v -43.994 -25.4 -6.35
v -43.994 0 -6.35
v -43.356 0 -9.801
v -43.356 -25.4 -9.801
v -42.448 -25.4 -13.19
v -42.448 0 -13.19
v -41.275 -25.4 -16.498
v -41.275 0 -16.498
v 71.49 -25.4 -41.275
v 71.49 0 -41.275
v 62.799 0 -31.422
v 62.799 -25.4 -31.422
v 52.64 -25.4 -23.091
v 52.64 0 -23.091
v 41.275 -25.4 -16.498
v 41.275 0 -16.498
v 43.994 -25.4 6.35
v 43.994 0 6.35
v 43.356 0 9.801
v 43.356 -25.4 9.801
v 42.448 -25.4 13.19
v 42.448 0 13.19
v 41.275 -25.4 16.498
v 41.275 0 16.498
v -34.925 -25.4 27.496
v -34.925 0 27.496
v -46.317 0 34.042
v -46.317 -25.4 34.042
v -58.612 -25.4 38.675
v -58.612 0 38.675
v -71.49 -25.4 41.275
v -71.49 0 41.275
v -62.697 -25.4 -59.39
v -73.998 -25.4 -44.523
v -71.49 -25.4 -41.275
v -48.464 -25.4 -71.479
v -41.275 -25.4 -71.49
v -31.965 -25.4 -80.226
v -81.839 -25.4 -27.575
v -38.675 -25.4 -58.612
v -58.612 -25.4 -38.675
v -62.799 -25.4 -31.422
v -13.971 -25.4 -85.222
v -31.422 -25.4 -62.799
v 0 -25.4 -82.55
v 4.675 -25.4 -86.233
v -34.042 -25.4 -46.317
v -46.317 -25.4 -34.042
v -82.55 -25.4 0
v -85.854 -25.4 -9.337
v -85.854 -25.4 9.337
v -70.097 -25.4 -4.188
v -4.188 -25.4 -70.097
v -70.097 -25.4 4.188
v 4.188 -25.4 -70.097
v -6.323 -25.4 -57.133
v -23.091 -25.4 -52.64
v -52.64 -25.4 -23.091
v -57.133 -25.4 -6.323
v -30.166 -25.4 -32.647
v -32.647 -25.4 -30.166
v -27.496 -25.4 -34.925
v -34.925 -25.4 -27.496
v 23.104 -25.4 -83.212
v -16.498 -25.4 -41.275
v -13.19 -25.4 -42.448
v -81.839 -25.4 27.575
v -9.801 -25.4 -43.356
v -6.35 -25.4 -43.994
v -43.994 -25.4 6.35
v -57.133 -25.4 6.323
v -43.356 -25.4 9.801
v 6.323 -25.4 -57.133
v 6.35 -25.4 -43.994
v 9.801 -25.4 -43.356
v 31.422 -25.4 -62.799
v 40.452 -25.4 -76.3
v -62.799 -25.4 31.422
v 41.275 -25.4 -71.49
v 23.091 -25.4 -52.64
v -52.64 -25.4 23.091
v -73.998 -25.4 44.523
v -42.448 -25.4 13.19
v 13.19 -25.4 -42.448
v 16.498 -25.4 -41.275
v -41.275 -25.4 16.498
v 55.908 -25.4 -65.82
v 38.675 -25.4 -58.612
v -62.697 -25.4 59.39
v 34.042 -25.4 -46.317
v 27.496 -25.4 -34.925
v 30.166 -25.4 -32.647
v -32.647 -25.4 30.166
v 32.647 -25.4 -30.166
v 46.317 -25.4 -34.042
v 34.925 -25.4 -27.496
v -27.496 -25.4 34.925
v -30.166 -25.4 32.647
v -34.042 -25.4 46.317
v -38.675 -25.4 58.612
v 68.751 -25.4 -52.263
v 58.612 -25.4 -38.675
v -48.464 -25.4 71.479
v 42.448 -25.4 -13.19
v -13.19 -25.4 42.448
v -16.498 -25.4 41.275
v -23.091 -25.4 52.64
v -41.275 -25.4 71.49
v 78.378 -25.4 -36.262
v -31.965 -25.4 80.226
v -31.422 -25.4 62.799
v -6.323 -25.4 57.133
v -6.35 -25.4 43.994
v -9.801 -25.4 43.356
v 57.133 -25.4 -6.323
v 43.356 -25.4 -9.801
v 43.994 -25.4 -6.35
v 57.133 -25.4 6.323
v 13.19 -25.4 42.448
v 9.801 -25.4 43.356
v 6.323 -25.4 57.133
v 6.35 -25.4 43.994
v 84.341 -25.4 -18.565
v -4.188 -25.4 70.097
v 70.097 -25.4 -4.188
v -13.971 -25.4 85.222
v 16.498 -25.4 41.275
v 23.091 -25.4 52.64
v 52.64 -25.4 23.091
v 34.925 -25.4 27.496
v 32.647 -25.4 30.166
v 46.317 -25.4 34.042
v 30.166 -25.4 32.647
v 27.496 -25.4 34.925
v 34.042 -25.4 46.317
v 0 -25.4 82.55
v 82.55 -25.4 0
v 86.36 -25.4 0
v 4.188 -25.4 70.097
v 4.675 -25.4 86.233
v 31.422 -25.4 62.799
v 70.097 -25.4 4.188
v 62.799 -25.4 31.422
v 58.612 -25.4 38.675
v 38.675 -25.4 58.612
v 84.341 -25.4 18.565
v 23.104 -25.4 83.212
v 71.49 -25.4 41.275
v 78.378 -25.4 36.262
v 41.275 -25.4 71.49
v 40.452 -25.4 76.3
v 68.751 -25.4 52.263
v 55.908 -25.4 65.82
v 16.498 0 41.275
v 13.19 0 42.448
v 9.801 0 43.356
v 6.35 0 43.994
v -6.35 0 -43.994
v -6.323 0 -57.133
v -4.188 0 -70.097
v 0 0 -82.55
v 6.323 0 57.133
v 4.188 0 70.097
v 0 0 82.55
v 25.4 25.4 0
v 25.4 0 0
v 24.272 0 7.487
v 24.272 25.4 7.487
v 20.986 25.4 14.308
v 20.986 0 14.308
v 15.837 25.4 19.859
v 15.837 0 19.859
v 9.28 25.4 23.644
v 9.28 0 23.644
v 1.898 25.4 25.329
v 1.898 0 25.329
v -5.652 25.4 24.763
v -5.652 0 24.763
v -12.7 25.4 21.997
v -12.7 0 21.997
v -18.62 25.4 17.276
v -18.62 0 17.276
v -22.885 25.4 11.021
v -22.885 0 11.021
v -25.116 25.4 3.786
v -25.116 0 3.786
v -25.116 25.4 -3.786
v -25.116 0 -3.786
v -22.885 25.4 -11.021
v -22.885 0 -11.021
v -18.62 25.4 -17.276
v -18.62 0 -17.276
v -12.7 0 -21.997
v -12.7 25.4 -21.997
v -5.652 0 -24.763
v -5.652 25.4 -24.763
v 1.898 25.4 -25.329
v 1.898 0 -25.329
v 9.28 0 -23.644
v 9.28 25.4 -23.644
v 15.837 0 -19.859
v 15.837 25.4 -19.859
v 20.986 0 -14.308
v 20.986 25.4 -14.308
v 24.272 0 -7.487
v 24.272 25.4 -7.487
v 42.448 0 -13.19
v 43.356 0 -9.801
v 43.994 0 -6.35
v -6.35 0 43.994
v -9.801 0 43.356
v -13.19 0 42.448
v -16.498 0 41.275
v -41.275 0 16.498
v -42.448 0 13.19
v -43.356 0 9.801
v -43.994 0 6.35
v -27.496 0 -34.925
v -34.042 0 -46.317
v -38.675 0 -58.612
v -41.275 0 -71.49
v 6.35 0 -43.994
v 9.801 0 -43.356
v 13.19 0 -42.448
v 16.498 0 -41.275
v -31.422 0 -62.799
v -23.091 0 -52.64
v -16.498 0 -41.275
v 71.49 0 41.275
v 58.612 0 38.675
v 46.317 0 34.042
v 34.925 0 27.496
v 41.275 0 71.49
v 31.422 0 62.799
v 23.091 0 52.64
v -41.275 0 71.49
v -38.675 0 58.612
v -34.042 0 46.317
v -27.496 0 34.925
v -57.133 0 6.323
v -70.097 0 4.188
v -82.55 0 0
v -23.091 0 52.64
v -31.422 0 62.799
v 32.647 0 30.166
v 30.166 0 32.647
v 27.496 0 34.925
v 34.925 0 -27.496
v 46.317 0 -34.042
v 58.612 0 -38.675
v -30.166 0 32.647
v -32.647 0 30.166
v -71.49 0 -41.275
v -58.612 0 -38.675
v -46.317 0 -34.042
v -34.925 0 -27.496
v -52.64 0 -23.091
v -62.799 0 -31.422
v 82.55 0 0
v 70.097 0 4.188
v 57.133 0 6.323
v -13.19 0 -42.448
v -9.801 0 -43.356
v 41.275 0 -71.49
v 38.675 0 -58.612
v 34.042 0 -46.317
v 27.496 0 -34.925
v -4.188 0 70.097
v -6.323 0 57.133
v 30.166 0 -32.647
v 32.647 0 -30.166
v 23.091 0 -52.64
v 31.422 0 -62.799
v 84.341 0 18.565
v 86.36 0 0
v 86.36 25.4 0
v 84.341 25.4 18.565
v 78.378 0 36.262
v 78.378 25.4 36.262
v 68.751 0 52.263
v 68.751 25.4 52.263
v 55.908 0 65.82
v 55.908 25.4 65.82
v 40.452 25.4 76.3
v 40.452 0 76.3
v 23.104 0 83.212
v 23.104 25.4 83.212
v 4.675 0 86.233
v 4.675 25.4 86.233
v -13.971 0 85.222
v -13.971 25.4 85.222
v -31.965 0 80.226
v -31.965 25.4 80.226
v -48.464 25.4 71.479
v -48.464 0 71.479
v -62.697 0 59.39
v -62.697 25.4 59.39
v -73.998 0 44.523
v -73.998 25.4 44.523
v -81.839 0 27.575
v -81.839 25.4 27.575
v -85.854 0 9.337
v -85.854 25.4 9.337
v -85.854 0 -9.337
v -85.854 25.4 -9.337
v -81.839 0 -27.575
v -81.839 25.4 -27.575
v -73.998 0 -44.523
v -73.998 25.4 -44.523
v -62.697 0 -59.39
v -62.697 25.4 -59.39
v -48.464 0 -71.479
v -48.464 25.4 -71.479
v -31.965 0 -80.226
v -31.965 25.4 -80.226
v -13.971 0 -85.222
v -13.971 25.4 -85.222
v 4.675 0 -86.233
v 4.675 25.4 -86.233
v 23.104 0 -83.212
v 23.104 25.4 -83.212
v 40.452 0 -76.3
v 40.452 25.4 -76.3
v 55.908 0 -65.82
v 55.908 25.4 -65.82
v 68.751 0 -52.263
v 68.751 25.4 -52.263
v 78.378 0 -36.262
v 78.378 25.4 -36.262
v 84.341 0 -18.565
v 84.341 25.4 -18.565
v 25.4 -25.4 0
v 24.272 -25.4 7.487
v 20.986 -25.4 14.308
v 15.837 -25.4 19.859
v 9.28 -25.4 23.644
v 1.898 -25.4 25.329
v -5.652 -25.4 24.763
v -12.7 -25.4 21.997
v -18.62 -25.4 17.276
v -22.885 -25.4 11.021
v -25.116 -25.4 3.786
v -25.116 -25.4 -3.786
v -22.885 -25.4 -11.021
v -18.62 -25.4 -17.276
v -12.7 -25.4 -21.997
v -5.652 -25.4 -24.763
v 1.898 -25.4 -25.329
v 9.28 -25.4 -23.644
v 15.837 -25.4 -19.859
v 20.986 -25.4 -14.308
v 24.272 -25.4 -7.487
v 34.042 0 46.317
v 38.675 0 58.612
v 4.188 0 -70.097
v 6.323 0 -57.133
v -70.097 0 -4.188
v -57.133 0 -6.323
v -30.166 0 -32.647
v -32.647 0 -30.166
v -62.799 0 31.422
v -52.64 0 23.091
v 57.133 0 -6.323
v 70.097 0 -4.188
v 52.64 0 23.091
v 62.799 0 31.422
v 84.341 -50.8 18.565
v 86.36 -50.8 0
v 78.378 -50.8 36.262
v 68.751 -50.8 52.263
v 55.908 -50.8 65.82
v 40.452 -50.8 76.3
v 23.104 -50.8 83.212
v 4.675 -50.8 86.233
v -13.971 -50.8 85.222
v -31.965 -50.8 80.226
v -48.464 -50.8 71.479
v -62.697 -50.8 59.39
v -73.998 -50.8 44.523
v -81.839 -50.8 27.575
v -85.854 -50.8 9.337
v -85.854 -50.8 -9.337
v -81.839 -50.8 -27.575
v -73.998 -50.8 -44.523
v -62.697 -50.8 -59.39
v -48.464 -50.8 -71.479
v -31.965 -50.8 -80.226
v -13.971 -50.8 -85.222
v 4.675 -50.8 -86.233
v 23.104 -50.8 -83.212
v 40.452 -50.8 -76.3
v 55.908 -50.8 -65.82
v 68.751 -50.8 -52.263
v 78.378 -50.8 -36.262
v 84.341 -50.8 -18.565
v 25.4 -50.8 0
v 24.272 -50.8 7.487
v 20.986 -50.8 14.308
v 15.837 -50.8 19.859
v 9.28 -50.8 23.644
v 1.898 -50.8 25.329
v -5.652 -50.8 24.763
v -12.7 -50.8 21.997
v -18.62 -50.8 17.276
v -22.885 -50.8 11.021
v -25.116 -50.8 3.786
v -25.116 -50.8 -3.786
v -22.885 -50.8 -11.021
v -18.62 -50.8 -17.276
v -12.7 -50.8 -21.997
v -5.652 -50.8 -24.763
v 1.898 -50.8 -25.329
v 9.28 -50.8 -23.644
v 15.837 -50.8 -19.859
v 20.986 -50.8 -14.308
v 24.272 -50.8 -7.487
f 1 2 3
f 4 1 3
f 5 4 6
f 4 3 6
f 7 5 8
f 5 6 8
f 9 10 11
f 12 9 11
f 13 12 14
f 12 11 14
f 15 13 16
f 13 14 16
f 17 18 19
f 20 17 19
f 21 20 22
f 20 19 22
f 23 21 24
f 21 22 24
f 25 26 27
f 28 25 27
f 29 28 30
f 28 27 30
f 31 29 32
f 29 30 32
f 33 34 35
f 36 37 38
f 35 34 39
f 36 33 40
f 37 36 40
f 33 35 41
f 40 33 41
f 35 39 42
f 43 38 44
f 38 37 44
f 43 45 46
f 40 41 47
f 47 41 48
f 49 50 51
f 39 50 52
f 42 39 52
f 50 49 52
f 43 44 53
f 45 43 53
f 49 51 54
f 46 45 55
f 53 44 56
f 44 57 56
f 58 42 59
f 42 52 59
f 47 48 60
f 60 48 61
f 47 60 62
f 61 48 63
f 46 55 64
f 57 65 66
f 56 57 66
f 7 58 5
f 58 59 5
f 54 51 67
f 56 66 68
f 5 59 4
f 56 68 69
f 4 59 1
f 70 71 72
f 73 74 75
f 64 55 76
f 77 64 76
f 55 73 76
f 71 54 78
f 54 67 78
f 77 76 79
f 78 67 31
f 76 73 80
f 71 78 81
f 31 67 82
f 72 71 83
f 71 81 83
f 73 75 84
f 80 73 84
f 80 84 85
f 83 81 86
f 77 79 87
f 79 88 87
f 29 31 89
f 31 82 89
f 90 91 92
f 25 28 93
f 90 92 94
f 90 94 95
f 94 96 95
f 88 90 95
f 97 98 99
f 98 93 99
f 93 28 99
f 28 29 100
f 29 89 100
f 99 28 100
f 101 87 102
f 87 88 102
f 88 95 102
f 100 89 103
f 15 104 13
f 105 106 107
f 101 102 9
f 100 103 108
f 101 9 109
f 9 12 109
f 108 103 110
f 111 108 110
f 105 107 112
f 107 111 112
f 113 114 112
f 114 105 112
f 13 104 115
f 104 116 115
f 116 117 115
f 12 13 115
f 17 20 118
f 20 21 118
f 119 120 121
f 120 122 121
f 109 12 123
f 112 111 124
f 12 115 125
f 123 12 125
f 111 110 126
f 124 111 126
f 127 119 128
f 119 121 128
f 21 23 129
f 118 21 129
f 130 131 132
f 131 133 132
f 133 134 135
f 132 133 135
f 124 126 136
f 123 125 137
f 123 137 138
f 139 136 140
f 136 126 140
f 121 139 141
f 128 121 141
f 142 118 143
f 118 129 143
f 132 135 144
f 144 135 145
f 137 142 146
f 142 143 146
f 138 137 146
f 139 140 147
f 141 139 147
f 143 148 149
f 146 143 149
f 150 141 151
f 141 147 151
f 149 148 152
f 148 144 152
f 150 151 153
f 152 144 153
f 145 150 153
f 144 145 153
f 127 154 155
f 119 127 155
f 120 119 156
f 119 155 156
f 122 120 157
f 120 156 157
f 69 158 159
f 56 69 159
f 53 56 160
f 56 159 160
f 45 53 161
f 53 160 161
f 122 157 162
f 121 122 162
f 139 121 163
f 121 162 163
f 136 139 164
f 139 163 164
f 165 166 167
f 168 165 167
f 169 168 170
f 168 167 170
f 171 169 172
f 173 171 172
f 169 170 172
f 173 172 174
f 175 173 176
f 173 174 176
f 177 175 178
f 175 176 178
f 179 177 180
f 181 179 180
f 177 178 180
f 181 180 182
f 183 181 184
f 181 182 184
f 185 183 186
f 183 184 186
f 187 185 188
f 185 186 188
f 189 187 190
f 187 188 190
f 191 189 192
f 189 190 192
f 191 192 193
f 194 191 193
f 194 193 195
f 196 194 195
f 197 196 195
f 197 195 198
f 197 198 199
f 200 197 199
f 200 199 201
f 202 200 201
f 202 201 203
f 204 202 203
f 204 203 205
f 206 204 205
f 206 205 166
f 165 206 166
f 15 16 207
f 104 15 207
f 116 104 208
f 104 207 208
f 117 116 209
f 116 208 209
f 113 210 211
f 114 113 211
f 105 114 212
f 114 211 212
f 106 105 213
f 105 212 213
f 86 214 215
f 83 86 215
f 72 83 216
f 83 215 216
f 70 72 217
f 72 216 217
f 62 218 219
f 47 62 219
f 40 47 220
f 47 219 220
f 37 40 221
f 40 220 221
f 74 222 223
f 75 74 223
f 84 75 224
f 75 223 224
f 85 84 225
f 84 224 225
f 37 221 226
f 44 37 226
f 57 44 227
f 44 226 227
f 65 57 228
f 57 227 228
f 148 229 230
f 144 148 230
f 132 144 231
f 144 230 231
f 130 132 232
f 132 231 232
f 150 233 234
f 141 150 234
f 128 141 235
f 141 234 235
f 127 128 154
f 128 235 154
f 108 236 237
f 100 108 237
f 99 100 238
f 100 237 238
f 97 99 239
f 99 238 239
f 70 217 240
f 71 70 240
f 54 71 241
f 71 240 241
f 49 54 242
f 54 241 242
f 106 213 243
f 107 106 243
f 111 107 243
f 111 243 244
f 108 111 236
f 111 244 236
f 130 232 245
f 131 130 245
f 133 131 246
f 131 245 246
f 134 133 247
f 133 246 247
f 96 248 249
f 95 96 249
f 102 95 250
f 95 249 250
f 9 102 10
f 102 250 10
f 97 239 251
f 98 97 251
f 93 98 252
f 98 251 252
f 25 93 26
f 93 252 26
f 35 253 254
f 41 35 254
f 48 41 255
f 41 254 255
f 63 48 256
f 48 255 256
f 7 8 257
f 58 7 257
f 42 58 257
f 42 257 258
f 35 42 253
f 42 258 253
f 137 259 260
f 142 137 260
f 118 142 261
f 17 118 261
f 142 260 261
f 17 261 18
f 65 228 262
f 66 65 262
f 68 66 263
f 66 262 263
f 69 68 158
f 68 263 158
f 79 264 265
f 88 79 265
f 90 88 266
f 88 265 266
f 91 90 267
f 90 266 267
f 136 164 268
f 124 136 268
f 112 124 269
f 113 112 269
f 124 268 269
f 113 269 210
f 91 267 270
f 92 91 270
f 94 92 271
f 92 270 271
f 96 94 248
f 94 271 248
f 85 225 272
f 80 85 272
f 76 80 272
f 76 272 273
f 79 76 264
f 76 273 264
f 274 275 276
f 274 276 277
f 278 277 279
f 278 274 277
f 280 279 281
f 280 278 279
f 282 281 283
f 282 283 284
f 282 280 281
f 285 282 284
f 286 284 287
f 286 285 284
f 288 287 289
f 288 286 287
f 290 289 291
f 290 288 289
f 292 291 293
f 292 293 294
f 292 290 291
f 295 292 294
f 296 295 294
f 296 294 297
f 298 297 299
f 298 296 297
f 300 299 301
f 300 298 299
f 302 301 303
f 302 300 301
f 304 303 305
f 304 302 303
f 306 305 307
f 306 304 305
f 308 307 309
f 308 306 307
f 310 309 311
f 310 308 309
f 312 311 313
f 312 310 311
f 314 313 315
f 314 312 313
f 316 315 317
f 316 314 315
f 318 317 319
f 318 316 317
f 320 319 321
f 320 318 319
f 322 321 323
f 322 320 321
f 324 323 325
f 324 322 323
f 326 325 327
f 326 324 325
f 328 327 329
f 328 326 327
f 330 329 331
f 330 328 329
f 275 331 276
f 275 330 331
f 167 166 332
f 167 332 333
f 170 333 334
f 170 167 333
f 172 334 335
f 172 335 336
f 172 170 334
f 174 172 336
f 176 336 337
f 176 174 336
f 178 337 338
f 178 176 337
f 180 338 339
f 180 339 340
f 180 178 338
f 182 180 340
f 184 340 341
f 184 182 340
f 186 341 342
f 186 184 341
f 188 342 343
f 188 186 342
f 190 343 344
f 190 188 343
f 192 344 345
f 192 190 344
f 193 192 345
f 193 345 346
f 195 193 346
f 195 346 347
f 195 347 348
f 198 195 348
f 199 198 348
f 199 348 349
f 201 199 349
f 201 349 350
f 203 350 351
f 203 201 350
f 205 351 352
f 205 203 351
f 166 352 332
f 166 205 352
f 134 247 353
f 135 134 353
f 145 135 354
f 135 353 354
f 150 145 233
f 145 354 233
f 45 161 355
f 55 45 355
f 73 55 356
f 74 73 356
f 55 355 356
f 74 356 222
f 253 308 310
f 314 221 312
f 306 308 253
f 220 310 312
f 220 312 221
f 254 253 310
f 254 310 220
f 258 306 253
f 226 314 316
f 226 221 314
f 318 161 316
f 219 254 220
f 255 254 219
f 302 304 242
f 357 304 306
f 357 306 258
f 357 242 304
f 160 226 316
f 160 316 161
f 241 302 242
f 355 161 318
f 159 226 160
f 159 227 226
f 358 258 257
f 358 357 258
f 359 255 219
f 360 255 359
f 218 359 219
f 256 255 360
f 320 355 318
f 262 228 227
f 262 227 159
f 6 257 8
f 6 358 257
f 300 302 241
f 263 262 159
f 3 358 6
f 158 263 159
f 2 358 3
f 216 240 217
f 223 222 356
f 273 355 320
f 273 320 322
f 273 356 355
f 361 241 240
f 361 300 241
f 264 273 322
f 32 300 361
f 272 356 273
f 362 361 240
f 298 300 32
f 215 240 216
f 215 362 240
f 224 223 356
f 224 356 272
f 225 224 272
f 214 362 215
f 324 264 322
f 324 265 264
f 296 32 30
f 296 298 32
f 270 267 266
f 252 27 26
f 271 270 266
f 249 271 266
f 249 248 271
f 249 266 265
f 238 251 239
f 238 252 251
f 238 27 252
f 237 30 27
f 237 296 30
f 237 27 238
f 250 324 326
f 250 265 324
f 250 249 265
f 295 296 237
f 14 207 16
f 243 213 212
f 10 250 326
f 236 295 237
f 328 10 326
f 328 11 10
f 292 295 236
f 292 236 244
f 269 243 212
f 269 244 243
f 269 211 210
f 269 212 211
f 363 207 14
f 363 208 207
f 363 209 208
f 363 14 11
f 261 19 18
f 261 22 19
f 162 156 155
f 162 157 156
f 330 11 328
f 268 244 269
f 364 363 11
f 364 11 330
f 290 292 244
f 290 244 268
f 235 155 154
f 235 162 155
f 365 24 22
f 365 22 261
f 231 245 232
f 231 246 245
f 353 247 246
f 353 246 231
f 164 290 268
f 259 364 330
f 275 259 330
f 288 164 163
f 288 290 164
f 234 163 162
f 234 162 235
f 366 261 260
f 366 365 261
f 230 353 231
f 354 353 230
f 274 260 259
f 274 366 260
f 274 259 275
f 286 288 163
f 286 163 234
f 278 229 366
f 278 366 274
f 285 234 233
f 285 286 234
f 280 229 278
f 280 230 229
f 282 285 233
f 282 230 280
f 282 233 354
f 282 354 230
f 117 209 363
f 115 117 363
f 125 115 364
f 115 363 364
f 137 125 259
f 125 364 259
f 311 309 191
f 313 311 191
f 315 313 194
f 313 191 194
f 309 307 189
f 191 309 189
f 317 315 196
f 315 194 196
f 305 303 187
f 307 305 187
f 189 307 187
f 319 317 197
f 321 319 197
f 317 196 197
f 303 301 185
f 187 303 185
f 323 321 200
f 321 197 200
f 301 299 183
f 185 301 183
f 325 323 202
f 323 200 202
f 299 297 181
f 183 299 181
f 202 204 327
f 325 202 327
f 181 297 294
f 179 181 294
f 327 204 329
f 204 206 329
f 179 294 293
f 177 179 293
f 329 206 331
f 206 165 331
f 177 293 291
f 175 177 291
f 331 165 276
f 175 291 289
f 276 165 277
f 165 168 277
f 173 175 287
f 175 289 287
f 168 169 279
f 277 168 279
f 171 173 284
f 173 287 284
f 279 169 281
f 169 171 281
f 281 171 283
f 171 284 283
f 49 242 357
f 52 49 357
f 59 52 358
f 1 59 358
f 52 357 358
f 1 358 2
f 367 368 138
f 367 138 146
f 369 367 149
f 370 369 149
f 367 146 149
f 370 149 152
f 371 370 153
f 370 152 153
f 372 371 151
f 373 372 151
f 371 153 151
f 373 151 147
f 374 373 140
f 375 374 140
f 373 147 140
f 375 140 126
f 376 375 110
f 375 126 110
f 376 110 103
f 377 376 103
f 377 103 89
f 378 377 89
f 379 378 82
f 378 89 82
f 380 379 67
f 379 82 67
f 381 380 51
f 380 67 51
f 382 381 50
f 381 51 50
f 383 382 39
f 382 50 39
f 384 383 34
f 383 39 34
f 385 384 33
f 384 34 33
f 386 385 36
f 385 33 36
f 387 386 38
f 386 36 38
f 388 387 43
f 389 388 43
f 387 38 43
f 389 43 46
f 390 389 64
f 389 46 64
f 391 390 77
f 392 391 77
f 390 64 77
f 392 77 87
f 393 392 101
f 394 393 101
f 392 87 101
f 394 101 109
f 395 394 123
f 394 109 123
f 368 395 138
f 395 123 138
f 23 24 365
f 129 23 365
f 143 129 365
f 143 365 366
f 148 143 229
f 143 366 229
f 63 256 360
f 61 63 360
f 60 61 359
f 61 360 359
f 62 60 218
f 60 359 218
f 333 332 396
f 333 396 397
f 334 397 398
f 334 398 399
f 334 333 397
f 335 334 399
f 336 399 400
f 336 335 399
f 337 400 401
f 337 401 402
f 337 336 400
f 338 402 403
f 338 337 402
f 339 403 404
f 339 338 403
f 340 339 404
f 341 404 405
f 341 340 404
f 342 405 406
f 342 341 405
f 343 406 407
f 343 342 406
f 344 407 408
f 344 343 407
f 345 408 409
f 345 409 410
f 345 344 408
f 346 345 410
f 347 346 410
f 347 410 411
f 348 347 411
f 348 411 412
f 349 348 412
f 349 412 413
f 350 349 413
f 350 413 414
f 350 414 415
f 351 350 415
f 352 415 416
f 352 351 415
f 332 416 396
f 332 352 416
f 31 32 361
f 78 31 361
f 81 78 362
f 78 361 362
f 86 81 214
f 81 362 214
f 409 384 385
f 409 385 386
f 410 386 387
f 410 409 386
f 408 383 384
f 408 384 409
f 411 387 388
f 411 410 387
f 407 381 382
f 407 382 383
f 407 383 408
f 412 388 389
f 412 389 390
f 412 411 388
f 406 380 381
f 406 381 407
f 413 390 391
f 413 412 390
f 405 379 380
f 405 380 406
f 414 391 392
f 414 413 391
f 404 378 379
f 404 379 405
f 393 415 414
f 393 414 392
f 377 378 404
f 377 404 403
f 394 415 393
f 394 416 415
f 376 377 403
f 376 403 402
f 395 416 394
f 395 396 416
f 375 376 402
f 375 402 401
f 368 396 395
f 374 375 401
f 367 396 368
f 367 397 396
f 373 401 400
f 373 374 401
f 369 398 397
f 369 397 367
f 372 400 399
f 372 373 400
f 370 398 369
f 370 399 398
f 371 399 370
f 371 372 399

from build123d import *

# Parameters (mm, degrees)
F0_R      = 31.75
F0_R_2    = 25.4
F1_DEPTH  = 25.4
F2_R      = 86.36
F3_DEPTH  = 25.4
F3_FACE_R = 25.4
F4_DEPTH  = 50.8
F5_R      = 86.36
F5_R_2    = 25.4
F6_DEPTH  = 25.4


with BuildPart() as f1:
    # F0 (on Front) → F1 (new body)
    with BuildSketch(Plane.XZ):
        with BuildLine():
            ThreePointArc((-6.35, 43.99409), (0, 44.45), (6.35, 43.99409))
            ThreePointArc((6.35, 43.99409), (5.51657, 63.657692), (0, 82.55))
            ThreePointArc((0, 82.55), (-5.51657, 63.657692), (-6.35, 43.99409))
        make_face()
        with BuildLine():
            ThreePointArc((-27.496306, 34.925), (-22.225, 38.494829), (-16.497784, 41.275))
            ThreePointArc((-16.497784, 41.275), (-27.051357, 57.887463), (-41.275, 71.490397))
            ThreePointArc((-41.275, 71.490397), (-36.606335, 52.370894), (-27.496306, 34.925))
        make_face()
        with BuildLine():
            ThreePointArc((-41.275, 16.497784), (-38.494829, 22.225), (-34.925, 27.496307))
            ThreePointArc((-34.925, 27.496307), (-52.370894, 36.606335), (-71.490397, 41.275))
            ThreePointArc((-71.490397, 41.275), (-57.887463, 27.051357), (-41.275, 16.497784))
        make_face()
        with BuildLine():
            ThreePointArc((-43.99409, -6.35), (-44.45, 0), (-43.99409, 6.35))
            ThreePointArc((-43.99409, 6.35), (-63.657692, 5.51657), (-82.55, 0))
            ThreePointArc((-82.55, 0), (-63.657692, -5.51657), (-43.99409, -6.35))
        make_face()
        with BuildLine():
            ThreePointArc((-71.490397, -41.275), (-52.370894, -36.606335), (-34.925, -27.496306))
            ThreePointArc((-34.925, -27.496306), (-38.494829, -22.225), (-41.275, -16.497784))
            ThreePointArc((-41.275, -16.497784), (-57.887463, -27.051357), (-71.490397, -41.275))
        make_face()
        with BuildLine():
            ThreePointArc((-41.275, -71.490397), (-27.051357, -57.887463), (-16.497784, -41.275))
            ThreePointArc((-16.497784, -41.275), (-22.225, -38.494829), (-27.496307, -34.925))
            ThreePointArc((-27.496307, -34.925), (-36.606335, -52.370894), (-41.275, -71.490397))
        make_face()
        with BuildLine():
            ThreePointArc((0, -82.55), (5.51657, -63.657692), (6.35, -43.99409))
            ThreePointArc((6.35, -43.99409), (0, -44.45), (-6.35, -43.99409))
            ThreePointArc((-6.35, -43.99409), (-5.51657, -63.657692), (0, -82.55))
        make_face()
        with BuildLine():
            ThreePointArc((41.275, -71.490397), (36.606335, -52.370894), (27.496306, -34.925))
            ThreePointArc((27.496306, -34.925), (22.225, -38.494829), (16.497784, -41.275))
            ThreePointArc((16.497784, -41.275), (27.051357, -57.887463), (41.275, -71.490397))
        make_face()
        with BuildLine():
            ThreePointArc((71.490397, -41.275), (57.887463, -27.051357), (41.275, -16.497784))
            ThreePointArc((41.275, -16.497784), (38.494829, -22.225), (34.925, -27.496307))
            ThreePointArc((34.925, -27.496307), (52.370894, -36.606335), (71.490397, -41.275))
        make_face()
        with BuildLine():
            ThreePointArc((43.99409, 6.35), (44.335876, 3.183173), (44.45, 0))
            ThreePointArc((44.45, 0), (44.335876, -3.183173), (43.99409, -6.35))
            ThreePointArc((43.99409, -6.35), (63.657692, -5.51657), (82.55, 0))
            ThreePointArc((82.55, 0), (63.657692, 5.51657), (43.99409, 6.35))
        make_face()
        with BuildLine():
            ThreePointArc((34.925, 27.496306), (38.494829, 22.225), (41.275, 16.497784))
            ThreePointArc((41.275, 16.497784), (57.887463, 27.051357), (71.490397, 41.275))
            ThreePointArc((71.490397, 41.275), (52.370894, 36.606335), (34.925, 27.496306))
        make_face()
        with BuildLine():
            ThreePointArc((16.497784, 41.275), (22.225, 38.494829), (27.496307, 34.925))
            ThreePointArc((27.496307, 34.925), (36.606335, 52.370894), (41.275, 71.490397))
            ThreePointArc((41.275, 71.490397), (27.051357, 57.887463), (16.497784, 41.275))
        make_face()
        with BuildLine():
            ThreePointArc((43.99409, -6.35), (44.335876, -3.183173), (44.45, 0))
            ThreePointArc((44.45, 0), (44.335876, 3.183173), (43.99409, 6.35))
            ThreePointArc((43.99409, 6.35), (42.935403, 11.504506), (41.275, 16.497784))
            ThreePointArc((41.275, 16.497784), (38.494829, 22.225), (34.925, 27.496306))
            ThreePointArc((34.925, 27.496306), (31.430896, 31.430896), (27.496307, 34.925))
            ThreePointArc((27.496307, 34.925), (22.225, 38.494829), (16.497784, 41.275))
            ThreePointArc((16.497784, 41.275), (11.504507, 42.935403), (6.35, 43.99409))
            ThreePointArc((6.35, 43.99409), (0, 44.45), (-6.35, 43.99409))
            ThreePointArc((-6.35, 43.99409), (-11.504506, 42.935403), (-16.497784, 41.275))
            ThreePointArc((-16.497784, 41.275), (-22.225, 38.494829), (-27.496306, 34.925))
            ThreePointArc((-27.496306, 34.925), (-31.430896, 31.430896), (-34.925, 27.496307))
            ThreePointArc((-34.925, 27.496307), (-38.494829, 22.225), (-41.275, 16.497784))
            ThreePointArc((-41.275, 16.497784), (-42.935403, 11.504507), (-43.99409, 6.35))
            ThreePointArc((-43.99409, 6.35), (-44.45, 0), (-43.99409, -6.35))
            ThreePointArc((-43.99409, -6.35), (-42.935403, -11.504506), (-41.275, -16.497784))
            ThreePointArc((-41.275, -16.497784), (-38.494829, -22.225), (-34.925, -27.496306))
            ThreePointArc((-34.925, -27.496306), (-31.430896, -31.430896), (-27.496307, -34.925))
            ThreePointArc((-27.496307, -34.925), (-22.225, -38.494829), (-16.497784, -41.275))
            ThreePointArc((-16.497784, -41.275), (-11.504507, -42.935403), (-6.35, -43.99409))
            ThreePointArc((-6.35, -43.99409), (0, -44.45), (6.35, -43.99409))
            ThreePointArc((6.35, -43.99409), (11.504506, -42.935403), (16.497784, -41.275))
            ThreePointArc((16.497784, -41.275), (22.225, -38.494829), (27.496306, -34.925))
            ThreePointArc((27.496306, -34.925), (31.430896, -31.430896), (34.925, -27.496307))
            ThreePointArc((34.925, -27.496307), (38.494829, -22.225), (41.275, -16.497784))
            ThreePointArc((41.275, -16.497784), (42.935403, -11.504507), (43.99409, -6.35))
        make_face()
        Circle(F0_R, mode=Mode.SUBTRACT)
        Circle(F0_R)
        Circle(F0_R_2, mode=Mode.SUBTRACT)
    extrude(amount=F1_DEPTH)

    # F2 (on Front) → F3 (join)
    with BuildSketch(Plane.XZ):
        Circle(F2_R)
    extrude(amount=-F3_DEPTH)

    # F3_face (on face) → F4 (cut)
    with BuildSketch(Plane.XZ):
        Circle(F3_FACE_R)
    extrude(amount=-F4_DEPTH, mode=Mode.SUBTRACT)

    # F5 (on face) → F6 (join)
    with BuildSketch(Plane.XZ.offset(25.4)):
        Circle(F5_R)
        Circle(F5_R_2, mode=Mode.SUBTRACT)
    extrude(amount=F6_DEPTH)


solid = f1.part
